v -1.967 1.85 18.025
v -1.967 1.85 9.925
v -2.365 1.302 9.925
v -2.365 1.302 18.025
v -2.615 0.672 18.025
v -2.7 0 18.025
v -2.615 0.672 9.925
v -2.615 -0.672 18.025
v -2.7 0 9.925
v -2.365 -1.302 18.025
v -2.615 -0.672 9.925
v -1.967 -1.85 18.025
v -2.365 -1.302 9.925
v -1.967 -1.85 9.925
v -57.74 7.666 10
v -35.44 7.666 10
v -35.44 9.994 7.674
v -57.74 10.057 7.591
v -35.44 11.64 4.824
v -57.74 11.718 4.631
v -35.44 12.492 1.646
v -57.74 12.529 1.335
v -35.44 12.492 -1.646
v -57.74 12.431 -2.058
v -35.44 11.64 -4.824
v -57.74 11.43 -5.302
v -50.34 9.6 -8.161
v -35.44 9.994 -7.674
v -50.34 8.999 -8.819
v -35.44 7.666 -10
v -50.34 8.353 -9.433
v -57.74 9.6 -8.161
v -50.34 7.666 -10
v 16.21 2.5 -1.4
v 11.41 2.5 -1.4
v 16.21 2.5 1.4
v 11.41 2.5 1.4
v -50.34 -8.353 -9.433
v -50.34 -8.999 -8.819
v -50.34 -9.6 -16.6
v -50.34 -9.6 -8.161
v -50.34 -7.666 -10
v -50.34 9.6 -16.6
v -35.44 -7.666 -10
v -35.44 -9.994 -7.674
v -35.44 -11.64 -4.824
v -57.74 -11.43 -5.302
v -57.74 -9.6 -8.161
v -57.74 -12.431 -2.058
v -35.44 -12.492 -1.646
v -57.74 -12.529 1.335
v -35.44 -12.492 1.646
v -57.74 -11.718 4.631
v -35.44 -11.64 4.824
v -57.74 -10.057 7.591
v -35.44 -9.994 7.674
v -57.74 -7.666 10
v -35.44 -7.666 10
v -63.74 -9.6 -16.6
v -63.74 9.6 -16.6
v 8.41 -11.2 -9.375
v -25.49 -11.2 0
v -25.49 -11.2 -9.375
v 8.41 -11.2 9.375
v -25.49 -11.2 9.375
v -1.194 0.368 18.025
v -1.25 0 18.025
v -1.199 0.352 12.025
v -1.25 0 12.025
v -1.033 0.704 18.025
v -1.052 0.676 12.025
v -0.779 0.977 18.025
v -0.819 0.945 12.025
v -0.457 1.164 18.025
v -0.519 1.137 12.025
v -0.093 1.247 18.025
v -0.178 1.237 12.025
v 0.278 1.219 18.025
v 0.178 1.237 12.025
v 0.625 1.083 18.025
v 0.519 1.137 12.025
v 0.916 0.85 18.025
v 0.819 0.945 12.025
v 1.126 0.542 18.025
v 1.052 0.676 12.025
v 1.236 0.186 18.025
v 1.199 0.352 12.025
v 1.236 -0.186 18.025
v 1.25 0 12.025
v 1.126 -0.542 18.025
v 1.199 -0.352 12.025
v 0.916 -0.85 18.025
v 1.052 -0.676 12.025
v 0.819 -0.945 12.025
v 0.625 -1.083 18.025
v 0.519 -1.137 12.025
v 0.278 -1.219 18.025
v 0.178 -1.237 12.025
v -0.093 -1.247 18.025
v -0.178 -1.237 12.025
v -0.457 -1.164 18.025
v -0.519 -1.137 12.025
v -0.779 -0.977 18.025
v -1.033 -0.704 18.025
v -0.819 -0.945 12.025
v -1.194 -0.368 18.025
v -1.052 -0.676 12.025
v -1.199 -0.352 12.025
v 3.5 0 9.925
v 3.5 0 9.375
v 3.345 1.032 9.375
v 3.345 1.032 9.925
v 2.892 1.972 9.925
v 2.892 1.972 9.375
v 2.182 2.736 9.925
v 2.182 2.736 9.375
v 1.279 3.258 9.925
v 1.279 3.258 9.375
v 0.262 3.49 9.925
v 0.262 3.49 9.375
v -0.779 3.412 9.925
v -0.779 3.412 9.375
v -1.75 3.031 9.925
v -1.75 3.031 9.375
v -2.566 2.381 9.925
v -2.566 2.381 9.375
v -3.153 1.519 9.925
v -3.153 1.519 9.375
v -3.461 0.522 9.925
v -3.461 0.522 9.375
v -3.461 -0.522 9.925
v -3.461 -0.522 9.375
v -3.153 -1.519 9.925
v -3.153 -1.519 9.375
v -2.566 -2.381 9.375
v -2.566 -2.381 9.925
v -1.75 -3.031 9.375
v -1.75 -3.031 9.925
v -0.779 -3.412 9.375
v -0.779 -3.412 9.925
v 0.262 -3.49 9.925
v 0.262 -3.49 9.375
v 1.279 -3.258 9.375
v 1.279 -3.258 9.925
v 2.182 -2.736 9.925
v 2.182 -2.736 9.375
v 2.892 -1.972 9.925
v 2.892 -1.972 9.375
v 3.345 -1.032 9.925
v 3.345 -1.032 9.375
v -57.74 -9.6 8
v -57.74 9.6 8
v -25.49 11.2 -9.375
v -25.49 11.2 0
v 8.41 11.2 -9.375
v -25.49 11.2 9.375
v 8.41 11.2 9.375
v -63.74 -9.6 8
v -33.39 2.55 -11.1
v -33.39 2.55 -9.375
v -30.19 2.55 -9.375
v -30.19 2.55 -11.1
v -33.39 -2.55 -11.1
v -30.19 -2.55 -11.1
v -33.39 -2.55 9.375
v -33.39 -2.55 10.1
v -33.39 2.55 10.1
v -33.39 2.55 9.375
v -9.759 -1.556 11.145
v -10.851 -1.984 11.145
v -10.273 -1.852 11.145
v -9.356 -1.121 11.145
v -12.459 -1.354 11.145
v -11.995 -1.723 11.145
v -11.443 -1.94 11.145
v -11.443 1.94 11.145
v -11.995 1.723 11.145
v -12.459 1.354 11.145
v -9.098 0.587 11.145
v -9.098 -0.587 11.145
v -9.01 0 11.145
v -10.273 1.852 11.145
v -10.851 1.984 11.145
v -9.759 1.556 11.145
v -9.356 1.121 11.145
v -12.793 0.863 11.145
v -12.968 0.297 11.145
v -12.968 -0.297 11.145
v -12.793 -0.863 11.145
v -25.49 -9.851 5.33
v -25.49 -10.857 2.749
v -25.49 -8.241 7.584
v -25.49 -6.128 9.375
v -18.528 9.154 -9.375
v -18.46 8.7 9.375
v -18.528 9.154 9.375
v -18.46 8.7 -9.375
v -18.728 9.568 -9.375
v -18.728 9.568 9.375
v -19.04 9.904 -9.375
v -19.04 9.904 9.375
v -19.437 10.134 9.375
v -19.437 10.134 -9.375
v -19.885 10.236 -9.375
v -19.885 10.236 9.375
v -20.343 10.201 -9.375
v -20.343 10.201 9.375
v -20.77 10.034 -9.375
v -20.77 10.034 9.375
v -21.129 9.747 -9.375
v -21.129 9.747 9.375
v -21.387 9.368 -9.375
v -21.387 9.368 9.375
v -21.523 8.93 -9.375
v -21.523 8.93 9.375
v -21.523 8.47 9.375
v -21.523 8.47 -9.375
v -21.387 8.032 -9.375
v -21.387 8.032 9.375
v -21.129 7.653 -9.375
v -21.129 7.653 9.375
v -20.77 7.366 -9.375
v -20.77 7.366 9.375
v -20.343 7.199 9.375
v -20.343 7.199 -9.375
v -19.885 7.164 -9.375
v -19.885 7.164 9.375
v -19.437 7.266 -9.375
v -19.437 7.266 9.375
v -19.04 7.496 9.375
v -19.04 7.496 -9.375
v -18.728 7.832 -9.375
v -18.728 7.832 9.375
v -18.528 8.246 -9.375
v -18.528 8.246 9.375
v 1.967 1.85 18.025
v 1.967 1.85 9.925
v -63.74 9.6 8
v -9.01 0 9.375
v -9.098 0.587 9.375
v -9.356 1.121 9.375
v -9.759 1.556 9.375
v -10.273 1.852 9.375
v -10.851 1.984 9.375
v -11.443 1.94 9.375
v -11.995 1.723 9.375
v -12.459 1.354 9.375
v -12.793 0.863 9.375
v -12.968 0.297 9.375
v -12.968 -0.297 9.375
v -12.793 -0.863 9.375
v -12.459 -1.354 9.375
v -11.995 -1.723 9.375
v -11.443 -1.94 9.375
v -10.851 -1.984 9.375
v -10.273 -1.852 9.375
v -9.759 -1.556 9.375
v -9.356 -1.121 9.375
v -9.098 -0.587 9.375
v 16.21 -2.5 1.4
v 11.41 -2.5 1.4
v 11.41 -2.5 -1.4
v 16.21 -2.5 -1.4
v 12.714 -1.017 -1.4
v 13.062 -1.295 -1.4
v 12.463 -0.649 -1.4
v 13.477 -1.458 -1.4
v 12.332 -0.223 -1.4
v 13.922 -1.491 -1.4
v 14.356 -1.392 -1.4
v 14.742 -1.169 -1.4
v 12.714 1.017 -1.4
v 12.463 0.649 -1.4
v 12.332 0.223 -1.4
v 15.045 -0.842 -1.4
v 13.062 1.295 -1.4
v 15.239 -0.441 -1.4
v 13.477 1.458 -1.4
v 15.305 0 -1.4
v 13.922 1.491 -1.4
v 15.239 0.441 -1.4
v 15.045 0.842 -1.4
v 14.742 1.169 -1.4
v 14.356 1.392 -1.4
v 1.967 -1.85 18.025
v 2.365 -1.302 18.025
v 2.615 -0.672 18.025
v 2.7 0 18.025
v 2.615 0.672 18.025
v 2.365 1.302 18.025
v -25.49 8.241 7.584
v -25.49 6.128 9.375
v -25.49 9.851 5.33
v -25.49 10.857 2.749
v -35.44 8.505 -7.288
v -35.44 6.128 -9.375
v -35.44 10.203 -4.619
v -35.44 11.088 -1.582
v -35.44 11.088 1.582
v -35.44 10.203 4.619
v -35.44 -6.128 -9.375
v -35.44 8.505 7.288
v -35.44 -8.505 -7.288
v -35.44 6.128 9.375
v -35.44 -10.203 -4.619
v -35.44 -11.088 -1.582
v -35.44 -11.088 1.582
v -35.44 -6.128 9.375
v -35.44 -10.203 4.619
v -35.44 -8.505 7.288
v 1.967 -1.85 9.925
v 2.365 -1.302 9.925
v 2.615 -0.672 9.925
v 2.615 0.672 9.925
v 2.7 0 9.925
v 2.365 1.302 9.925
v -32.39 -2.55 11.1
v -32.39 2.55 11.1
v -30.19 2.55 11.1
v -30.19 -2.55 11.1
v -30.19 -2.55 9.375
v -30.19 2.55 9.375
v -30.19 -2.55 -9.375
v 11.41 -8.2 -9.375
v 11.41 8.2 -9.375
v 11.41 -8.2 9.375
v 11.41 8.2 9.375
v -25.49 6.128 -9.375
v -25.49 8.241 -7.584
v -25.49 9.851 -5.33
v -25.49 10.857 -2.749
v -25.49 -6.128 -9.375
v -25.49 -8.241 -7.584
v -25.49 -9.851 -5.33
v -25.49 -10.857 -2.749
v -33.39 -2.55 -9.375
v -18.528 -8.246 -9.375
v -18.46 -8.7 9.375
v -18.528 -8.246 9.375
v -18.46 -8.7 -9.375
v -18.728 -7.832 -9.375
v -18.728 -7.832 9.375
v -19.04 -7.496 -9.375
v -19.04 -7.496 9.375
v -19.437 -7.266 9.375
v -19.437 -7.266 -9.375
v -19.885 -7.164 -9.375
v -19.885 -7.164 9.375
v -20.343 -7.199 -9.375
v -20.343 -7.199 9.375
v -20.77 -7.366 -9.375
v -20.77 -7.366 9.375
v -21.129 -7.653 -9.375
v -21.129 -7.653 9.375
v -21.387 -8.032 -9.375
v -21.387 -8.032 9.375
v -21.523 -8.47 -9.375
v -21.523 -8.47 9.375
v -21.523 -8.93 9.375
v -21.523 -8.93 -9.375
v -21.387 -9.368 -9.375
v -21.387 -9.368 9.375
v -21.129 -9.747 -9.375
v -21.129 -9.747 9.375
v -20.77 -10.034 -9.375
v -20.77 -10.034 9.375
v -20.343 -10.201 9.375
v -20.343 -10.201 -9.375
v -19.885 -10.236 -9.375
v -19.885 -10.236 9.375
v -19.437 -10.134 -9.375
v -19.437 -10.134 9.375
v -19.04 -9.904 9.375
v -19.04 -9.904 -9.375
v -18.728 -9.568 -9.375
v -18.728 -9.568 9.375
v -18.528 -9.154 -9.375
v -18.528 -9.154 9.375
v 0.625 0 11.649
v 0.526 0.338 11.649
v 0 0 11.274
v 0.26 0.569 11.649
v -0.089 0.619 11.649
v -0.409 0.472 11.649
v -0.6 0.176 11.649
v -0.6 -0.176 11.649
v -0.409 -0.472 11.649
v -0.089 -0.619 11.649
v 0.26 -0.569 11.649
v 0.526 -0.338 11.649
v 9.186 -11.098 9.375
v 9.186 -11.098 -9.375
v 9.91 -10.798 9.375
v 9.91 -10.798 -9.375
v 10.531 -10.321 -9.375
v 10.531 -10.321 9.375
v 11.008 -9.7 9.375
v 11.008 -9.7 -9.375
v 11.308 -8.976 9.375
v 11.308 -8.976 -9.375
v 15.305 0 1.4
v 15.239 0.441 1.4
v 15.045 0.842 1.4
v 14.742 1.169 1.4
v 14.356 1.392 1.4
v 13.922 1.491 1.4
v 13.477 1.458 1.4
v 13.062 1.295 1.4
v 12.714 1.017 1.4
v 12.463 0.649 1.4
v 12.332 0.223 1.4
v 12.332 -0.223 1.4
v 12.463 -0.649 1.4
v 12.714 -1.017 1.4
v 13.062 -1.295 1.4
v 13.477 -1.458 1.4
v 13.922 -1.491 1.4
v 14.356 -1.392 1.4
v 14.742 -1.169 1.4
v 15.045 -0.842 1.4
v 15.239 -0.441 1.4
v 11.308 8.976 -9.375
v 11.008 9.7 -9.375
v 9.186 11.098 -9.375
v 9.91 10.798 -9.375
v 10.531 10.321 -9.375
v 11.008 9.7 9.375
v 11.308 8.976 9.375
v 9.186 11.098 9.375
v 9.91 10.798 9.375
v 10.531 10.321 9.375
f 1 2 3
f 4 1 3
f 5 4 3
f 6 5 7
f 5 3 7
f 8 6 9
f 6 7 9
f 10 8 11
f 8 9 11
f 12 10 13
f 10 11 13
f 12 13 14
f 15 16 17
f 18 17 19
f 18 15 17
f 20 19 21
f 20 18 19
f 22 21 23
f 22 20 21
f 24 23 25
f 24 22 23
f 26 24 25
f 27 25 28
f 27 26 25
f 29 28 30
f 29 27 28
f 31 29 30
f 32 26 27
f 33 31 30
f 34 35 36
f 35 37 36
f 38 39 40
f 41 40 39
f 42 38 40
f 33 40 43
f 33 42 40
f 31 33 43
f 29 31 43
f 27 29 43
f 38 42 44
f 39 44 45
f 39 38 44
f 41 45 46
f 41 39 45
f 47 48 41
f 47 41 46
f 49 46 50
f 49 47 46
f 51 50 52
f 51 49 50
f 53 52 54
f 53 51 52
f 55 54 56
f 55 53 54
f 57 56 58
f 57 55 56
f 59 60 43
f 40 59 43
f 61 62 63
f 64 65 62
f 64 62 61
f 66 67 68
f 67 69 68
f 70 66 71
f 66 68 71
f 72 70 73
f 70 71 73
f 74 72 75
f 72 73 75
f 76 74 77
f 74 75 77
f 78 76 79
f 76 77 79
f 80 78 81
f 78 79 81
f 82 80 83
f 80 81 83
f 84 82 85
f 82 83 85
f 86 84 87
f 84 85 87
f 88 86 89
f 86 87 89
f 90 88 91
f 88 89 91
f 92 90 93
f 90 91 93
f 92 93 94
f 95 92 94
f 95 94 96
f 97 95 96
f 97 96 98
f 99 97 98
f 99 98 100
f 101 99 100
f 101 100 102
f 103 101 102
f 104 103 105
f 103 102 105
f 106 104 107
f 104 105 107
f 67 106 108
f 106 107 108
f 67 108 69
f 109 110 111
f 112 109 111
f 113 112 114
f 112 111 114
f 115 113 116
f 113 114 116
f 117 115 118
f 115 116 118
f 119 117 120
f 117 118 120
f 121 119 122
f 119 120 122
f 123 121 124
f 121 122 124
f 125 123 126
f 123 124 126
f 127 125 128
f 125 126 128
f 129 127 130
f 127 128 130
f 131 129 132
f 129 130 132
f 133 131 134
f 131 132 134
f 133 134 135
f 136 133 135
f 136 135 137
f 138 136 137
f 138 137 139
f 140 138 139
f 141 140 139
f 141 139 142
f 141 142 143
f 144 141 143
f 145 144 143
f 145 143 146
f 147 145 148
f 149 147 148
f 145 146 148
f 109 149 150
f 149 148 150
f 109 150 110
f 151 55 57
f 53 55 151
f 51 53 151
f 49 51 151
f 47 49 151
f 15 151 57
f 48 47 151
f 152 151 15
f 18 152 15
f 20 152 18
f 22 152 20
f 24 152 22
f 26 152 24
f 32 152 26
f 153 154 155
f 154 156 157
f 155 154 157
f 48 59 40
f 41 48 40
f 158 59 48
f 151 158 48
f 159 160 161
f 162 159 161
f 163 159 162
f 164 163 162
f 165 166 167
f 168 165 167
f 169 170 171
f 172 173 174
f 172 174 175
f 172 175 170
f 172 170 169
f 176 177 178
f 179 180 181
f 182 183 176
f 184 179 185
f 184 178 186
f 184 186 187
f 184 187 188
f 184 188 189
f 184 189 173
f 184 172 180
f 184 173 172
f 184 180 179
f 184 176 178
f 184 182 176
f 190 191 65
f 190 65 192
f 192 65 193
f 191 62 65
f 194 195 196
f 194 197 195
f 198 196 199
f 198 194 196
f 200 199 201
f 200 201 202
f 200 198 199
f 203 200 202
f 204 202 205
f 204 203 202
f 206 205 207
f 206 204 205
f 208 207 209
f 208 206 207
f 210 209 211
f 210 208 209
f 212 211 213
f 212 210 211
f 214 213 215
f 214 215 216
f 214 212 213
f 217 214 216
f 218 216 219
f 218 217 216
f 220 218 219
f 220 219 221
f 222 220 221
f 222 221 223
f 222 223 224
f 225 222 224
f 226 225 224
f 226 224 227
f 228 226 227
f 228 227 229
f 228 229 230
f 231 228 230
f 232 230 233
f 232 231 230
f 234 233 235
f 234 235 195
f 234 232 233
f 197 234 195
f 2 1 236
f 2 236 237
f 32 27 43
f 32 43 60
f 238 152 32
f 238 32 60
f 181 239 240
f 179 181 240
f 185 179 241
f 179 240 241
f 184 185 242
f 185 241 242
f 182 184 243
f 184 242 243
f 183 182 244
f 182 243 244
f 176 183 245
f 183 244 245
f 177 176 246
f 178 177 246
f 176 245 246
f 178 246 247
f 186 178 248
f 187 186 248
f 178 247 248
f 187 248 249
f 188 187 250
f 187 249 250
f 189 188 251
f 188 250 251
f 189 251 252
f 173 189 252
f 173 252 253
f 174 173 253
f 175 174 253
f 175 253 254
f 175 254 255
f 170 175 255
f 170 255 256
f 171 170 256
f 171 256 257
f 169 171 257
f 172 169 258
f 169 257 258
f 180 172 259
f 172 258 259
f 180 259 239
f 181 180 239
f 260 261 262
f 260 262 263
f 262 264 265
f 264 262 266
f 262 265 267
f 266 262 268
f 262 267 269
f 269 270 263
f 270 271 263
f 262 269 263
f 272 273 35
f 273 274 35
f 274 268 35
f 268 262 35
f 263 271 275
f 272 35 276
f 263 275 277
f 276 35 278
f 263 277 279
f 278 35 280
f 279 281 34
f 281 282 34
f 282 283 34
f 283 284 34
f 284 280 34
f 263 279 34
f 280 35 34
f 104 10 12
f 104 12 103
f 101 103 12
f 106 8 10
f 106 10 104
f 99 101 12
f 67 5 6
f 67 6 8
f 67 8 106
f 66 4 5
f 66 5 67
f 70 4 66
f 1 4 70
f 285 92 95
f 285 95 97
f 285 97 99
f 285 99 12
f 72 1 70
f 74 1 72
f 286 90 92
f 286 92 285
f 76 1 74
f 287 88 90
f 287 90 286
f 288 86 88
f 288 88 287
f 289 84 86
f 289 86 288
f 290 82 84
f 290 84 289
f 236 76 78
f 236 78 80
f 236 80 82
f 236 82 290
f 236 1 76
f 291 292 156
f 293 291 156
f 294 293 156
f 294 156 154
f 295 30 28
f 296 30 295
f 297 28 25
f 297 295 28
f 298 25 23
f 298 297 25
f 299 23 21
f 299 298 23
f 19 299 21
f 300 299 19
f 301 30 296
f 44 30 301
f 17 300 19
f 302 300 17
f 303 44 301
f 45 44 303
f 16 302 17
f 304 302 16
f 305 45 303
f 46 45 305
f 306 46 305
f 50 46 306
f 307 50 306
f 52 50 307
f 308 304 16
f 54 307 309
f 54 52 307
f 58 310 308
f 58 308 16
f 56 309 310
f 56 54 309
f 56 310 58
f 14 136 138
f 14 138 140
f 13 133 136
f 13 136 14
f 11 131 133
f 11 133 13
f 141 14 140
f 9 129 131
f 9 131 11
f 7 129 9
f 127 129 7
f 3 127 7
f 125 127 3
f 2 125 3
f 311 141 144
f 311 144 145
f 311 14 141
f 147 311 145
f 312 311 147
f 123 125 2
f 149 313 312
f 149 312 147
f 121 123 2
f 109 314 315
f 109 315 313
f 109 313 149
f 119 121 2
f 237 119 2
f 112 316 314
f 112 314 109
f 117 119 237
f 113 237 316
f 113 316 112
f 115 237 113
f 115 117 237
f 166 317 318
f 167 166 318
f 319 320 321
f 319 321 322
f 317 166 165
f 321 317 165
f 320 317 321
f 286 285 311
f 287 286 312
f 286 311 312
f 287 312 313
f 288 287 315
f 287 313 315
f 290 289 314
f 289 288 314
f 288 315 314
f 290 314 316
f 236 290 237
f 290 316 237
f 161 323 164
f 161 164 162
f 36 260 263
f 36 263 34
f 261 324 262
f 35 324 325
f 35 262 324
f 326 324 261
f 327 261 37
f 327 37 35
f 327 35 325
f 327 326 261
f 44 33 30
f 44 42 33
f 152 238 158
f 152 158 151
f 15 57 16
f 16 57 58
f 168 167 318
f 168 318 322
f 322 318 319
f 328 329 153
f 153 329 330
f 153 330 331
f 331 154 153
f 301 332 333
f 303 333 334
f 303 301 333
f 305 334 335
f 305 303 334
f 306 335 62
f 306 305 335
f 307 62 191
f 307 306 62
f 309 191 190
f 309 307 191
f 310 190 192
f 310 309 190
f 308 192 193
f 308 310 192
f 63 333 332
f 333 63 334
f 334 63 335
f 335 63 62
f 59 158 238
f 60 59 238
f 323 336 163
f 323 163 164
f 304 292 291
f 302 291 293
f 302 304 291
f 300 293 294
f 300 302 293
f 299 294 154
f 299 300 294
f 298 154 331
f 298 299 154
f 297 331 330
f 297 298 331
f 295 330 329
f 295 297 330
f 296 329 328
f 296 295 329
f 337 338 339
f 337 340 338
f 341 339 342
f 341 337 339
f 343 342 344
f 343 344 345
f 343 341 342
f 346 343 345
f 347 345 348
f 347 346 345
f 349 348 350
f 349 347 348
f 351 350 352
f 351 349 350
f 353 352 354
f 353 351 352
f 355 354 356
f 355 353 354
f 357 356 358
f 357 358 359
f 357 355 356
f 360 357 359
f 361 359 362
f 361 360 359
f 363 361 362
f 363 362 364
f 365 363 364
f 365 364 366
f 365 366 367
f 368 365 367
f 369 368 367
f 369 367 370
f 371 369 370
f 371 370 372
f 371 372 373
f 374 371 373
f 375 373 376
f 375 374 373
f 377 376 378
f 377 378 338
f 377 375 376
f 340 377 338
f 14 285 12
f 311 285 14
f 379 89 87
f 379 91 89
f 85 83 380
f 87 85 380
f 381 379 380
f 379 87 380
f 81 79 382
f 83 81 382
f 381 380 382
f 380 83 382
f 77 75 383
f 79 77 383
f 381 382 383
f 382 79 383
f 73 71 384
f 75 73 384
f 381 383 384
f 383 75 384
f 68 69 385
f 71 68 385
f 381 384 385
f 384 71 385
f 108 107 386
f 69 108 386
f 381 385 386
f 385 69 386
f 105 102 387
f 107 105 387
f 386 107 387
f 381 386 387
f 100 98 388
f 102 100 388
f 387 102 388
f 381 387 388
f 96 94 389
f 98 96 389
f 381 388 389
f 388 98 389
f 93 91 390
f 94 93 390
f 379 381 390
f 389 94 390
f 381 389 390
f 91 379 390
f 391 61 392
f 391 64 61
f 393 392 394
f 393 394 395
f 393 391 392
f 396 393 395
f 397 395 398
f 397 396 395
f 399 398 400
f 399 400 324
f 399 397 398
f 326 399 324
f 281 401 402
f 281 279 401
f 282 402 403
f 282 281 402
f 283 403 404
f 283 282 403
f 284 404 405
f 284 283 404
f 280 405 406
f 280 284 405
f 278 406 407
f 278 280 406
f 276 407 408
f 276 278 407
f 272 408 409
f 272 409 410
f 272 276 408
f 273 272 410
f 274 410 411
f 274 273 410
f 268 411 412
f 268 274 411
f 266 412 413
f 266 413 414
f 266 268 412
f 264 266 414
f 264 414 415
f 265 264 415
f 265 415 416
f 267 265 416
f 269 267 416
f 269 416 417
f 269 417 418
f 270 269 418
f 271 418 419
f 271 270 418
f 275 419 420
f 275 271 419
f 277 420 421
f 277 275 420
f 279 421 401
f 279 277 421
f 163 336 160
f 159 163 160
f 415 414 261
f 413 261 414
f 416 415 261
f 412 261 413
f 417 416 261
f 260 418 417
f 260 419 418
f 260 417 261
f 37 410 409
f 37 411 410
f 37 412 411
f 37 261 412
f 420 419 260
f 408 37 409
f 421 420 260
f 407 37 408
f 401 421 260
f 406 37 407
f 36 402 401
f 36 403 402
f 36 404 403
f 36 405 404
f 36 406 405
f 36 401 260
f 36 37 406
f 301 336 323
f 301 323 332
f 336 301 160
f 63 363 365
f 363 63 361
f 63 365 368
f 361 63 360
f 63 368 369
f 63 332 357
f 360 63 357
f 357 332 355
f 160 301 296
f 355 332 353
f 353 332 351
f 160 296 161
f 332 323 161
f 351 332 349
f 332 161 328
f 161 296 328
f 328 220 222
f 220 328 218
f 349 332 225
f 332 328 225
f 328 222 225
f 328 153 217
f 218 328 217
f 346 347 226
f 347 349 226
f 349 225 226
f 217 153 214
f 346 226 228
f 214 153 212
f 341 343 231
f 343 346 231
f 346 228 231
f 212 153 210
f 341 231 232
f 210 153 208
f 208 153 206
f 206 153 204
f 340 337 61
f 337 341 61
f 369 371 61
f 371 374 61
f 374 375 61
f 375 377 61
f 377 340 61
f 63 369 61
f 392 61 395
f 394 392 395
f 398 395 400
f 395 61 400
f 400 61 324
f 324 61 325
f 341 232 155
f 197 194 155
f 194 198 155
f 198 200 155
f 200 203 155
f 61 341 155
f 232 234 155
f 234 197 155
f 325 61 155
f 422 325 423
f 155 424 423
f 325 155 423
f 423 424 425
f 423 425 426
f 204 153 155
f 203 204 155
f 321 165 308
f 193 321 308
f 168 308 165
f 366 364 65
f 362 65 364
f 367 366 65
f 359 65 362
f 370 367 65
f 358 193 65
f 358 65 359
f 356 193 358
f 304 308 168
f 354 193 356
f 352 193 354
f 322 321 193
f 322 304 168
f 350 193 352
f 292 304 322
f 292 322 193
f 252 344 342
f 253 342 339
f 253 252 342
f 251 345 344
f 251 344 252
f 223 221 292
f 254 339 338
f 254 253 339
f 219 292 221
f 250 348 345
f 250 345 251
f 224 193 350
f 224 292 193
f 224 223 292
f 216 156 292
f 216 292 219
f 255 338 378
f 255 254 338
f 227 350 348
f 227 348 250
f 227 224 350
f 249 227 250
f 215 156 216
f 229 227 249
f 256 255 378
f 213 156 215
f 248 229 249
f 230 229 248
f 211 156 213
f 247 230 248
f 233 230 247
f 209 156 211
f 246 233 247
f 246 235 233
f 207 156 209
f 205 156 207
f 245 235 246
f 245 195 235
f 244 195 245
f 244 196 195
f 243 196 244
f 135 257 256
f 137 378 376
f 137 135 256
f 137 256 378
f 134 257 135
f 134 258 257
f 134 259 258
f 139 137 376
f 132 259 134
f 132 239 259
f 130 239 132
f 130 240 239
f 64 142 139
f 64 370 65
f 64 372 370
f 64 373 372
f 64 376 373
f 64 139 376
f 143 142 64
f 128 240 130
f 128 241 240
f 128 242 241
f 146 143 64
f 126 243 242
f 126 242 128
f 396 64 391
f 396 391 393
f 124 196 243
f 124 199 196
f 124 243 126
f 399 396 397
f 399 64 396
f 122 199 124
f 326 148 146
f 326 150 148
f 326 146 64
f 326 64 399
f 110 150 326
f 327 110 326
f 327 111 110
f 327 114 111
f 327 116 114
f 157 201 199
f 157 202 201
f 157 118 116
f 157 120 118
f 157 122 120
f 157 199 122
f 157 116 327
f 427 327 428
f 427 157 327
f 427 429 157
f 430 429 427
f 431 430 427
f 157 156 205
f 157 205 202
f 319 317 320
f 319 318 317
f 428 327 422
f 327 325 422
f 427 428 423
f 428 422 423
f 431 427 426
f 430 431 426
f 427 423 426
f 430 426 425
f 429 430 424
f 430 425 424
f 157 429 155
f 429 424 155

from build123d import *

# Parameters (mm, degrees)
CROQUIS1_W                    = 36.9
CROQUIS1_H                    = 22.4
CROQUIS1_R                    = 2.7
CROQUIS1_R_2                  = 1.99
CROQUIS1_R_3                  = 1.54
SALIENTE_EXTRUIR1_DEPTH       = 9.375
SALIENTE_EXTRUIR2_START       = 9.375
CROQUIS1_3_R                  = 2.7
SALIENTE_EXTRUIR2_DEPTH       = 8.65
SALIENTE_EXTRUIR3_START       = 9.375
CROQUIS1_5_R                  = 1.99
SALIENTE_EXTRUIR3_DEPTH       = 1.77
CROQUIS2_W                    = 8.65
CROQUIS2_H                    = 0.85
CORTAR_EXTRUIR1_DEPTH         = 3.385
CROQUIS1_6_W                  = 4.8
CROQUIS1_6_H                  = 5
CROQUIS1_6_R                  = 1.495
SALIENTE_EXTRUIR4_DEPTH       = 1.4
CROQUIS1_8_W                  = 7.4
CROQUIS1_8_H                  = 9.6
CROQUIS1_8_W_2                = 3.2
CROQUIS1_8_H_2                = 2.55
CROQUIS3_W                    = 22.3
CROQUIS3_H                    = 2.6
CORTAR_EXTRUIR2_DEPTH         = 13.6
CORTAR_EXTRUIR2_DEPTH_BACK    = 13.6
CROQUIS1_10_W                 = 3.2
CROQUIS1_10_H                 = 5.1
SALIENTE_EXTRUIR5_DEPTH       = 11.1
CROQUIS1_11_W                 = 6
CROQUIS1_11_H                 = 19.2
CROQUIS1_11_W_2               = 7.4
CROQUIS1_11_H_2               = 9.6
SALIENTE_EXTRUIR6_DEPTH       = 8
SALIENTE_EXTRUIR6_DEPTH_BACK  = 16.6
TALADRO_ROSCADO_M3X0_51_D     = 2.5
TALADRO_ROSCADO_M3X0_51_DEPTH = 6
TALADRO_ROSCADO_M3X0_51_TIP   = 0.751075774
REDONDEO1_R                   = 3
SALIENTE_EXTRUIR7_START       = 9.375
CROQUIS6_R                    = 3.5
SALIENTE_EXTRUIR7_DEPTH       = 0.55
CHAFL_N1_SIZE                 = 1


with BuildPart() as part:
    # Croquis1 → Saliente-Extruir1 (new body, symmetric)
    with BuildSketch(Plane.XY):
        with Locations((-7.04, 0)):
            Rectangle(CROQUIS1_W, CROQUIS1_H)
        Circle(CROQUIS1_R, mode=Mode.SUBTRACT)
        with Locations((-11, 0)):
            Circle(CROQUIS1_R_2, mode=Mode.SUBTRACT)
        with Locations((-20, 8.7)):
            Circle(CROQUIS1_R_3, mode=Mode.SUBTRACT)
        with Locations((-20, -8.7)):
            Circle(CROQUIS1_R_3, mode=Mode.SUBTRACT)
        Circle(CROQUIS1_R)
        with Locations((-11, 0)):
            Circle(CROQUIS1_R_2)
    extrude(amount=SALIENTE_EXTRUIR1_DEPTH, both=True)

    # Croquis1_3 → Saliente-Extruir2 (add)
    with BuildSketch(Plane.XY.offset(SALIENTE_EXTRUIR2_START)):
        Circle(CROQUIS1_3_R)
    extrude(amount=SALIENTE_EXTRUIR2_DEPTH)

    # Croquis1_5 → Saliente-Extruir3 (add)
    with BuildSketch(Plane.XY.offset(SALIENTE_EXTRUIR3_START)):
        with Locations((-11, 0)):
            Circle(CROQUIS1_5_R)
    extrude(amount=SALIENTE_EXTRUIR3_DEPTH)

    # Croquis2 → Cortar-Extruir1 (cut, symmetric)
    with BuildSketch(Plane(origin=(0, 0, 0), x_dir=(0, 0, -1), z_dir=(1, 0, 0))):
        with Locations((-13.7, 2.275)):
            Rectangle(CROQUIS2_W, CROQUIS2_H)
        with Locations((-13.7, -2.275)):
            Rectangle(CROQUIS2_W, CROQUIS2_H)
    extrude(amount=CORTAR_EXTRUIR1_DEPTH, both=True, mode=Mode.SUBTRACT)

    # Croquis1_6 → Saliente-Extruir4 (add, symmetric)
    with BuildSketch(Plane.XY):
        with Locations((13.81, 0)):
            Rectangle(CROQUIS1_6_W, CROQUIS1_6_H)
        with Locations((13.81, 0)):
            Circle(CROQUIS1_6_R, mode=Mode.SUBTRACT)
    extrude(amount=SALIENTE_EXTRUIR4_DEPTH, both=True)

    # Croquis1_8 → Revoluci_n1 (revolve)
    with BuildSketch(Plane.XY):
        Polygon((-30.19, 0), (-25.49, 0), (-25.49, 11.2), (-35.44, 11.2), (-35.44, 12.6), (-57.74, 12.6), (-57.74, 9.6), (-50.34, 9.6), (-50.34, 0), (-33.39, 0), (-33.39, 2.55), (-30.19, 2.55), align=None)
        with Locations((-54.04, 4.8)):
            Rectangle(CROQUIS1_8_W, CROQUIS1_8_H)
        with Locations((-31.79, 1.275)):
            Rectangle(CROQUIS1_8_W_2, CROQUIS1_8_H_2)
    revolve(axis=Axis((-25.49, 0, 0), (-1, 0, 0)))

    # Croquis3 → Cortar-Extruir2 (cut, two sides)
    with BuildSketch(Plane(origin=(0, 0, 0), x_dir=(1, 0, 0), z_dir=(0, 1, 0))) as cortar_extruir2_sk:
        Polygon((-35.44, 10), (-35.44, 9.375), (-25.49, 9.375), (-25.49, 11.2), (-35.44, 11.2), align=None)
        with Locations((-46.59, 11.3)):
            Rectangle(CROQUIS3_W, CROQUIS3_H)
        with Locations((-46.59, -11.3)):
            Rectangle(CROQUIS3_W, CROQUIS3_H)
        Polygon((-25.49, -9.375), (-35.44, -9.375), (-35.44, -10), (-35.44, -11.2), (-25.49, -11.2), align=None)
    extrude(amount=CORTAR_EXTRUIR2_DEPTH, mode=Mode.SUBTRACT)
    extrude(cortar_extruir2_sk.sketch, amount=-CORTAR_EXTRUIR2_DEPTH_BACK, mode=Mode.SUBTRACT)

    # Croquis1_10 → Saliente-Extruir5 (add, symmetric)
    with BuildSketch(Plane.XY):
        with Locations((-31.79, 0)):
            Rectangle(CROQUIS1_10_W, CROQUIS1_10_H)
    extrude(amount=SALIENTE_EXTRUIR5_DEPTH, both=True)

    # Croquis1_11 → Saliente-Extruir6 (add, two sides)
    with BuildSketch(Plane.XY) as saliente_extruir6_sk:
        with Locations((-60.74, 0)):
            Rectangle(CROQUIS1_11_W, CROQUIS1_11_H)
        with Locations((-54.04, 4.8)):
            Rectangle(CROQUIS1_11_W_2, CROQUIS1_11_H_2)
        with Locations((-54.04, -4.8)):
            Rectangle(CROQUIS1_11_W_2, CROQUIS1_11_H_2)
    extrude(amount=SALIENTE_EXTRUIR6_DEPTH)
    extrude(saliente_extruir6_sk.sketch, amount=-SALIENTE_EXTRUIR6_DEPTH_BACK)

    # Taladro roscado M3x0.51
    with Locations(Plane.XY.offset(18.025)):
        with Locations((0, 0)):
            Hole(TALADRO_ROSCADO_M3X0_51_D / 2, depth=TALADRO_ROSCADO_M3X0_51_DEPTH)
            with Locations((0, 0, -(TALADRO_ROSCADO_M3X0_51_DEPTH + TALADRO_ROSCADO_M3X0_51_TIP / 2))):  # 118° drill point
                Cone(0, TALADRO_ROSCADO_M3X0_51_D / 2, TALADRO_ROSCADO_M3X0_51_TIP, mode=Mode.SUBTRACT)

    # Redondeo1
    redondeo1_edges = [part.edges().sort_by_distance(p)[0] for p in [
        (11.41, 11.2, 0),
        (11.41, -11.2, 0),
    ]]
    fillet(redondeo1_edges, radius=REDONDEO1_R)

    # Croquis6 → Saliente-Extruir7 (add)
    with BuildSketch(Plane.XY.offset(SALIENTE_EXTRUIR7_START)):
        Circle(CROQUIS6_R)
    extrude(amount=SALIENTE_EXTRUIR7_DEPTH)

    # Chafl_n1
    chafl_n1_edges = [part.edges().sort_by_distance(p)[0] for p in [
        (-33.39, 0, 11.1),
    ]]
    chamfer(chafl_n1_edges, length=CHAFL_N1_SIZE)


solid = part.part
